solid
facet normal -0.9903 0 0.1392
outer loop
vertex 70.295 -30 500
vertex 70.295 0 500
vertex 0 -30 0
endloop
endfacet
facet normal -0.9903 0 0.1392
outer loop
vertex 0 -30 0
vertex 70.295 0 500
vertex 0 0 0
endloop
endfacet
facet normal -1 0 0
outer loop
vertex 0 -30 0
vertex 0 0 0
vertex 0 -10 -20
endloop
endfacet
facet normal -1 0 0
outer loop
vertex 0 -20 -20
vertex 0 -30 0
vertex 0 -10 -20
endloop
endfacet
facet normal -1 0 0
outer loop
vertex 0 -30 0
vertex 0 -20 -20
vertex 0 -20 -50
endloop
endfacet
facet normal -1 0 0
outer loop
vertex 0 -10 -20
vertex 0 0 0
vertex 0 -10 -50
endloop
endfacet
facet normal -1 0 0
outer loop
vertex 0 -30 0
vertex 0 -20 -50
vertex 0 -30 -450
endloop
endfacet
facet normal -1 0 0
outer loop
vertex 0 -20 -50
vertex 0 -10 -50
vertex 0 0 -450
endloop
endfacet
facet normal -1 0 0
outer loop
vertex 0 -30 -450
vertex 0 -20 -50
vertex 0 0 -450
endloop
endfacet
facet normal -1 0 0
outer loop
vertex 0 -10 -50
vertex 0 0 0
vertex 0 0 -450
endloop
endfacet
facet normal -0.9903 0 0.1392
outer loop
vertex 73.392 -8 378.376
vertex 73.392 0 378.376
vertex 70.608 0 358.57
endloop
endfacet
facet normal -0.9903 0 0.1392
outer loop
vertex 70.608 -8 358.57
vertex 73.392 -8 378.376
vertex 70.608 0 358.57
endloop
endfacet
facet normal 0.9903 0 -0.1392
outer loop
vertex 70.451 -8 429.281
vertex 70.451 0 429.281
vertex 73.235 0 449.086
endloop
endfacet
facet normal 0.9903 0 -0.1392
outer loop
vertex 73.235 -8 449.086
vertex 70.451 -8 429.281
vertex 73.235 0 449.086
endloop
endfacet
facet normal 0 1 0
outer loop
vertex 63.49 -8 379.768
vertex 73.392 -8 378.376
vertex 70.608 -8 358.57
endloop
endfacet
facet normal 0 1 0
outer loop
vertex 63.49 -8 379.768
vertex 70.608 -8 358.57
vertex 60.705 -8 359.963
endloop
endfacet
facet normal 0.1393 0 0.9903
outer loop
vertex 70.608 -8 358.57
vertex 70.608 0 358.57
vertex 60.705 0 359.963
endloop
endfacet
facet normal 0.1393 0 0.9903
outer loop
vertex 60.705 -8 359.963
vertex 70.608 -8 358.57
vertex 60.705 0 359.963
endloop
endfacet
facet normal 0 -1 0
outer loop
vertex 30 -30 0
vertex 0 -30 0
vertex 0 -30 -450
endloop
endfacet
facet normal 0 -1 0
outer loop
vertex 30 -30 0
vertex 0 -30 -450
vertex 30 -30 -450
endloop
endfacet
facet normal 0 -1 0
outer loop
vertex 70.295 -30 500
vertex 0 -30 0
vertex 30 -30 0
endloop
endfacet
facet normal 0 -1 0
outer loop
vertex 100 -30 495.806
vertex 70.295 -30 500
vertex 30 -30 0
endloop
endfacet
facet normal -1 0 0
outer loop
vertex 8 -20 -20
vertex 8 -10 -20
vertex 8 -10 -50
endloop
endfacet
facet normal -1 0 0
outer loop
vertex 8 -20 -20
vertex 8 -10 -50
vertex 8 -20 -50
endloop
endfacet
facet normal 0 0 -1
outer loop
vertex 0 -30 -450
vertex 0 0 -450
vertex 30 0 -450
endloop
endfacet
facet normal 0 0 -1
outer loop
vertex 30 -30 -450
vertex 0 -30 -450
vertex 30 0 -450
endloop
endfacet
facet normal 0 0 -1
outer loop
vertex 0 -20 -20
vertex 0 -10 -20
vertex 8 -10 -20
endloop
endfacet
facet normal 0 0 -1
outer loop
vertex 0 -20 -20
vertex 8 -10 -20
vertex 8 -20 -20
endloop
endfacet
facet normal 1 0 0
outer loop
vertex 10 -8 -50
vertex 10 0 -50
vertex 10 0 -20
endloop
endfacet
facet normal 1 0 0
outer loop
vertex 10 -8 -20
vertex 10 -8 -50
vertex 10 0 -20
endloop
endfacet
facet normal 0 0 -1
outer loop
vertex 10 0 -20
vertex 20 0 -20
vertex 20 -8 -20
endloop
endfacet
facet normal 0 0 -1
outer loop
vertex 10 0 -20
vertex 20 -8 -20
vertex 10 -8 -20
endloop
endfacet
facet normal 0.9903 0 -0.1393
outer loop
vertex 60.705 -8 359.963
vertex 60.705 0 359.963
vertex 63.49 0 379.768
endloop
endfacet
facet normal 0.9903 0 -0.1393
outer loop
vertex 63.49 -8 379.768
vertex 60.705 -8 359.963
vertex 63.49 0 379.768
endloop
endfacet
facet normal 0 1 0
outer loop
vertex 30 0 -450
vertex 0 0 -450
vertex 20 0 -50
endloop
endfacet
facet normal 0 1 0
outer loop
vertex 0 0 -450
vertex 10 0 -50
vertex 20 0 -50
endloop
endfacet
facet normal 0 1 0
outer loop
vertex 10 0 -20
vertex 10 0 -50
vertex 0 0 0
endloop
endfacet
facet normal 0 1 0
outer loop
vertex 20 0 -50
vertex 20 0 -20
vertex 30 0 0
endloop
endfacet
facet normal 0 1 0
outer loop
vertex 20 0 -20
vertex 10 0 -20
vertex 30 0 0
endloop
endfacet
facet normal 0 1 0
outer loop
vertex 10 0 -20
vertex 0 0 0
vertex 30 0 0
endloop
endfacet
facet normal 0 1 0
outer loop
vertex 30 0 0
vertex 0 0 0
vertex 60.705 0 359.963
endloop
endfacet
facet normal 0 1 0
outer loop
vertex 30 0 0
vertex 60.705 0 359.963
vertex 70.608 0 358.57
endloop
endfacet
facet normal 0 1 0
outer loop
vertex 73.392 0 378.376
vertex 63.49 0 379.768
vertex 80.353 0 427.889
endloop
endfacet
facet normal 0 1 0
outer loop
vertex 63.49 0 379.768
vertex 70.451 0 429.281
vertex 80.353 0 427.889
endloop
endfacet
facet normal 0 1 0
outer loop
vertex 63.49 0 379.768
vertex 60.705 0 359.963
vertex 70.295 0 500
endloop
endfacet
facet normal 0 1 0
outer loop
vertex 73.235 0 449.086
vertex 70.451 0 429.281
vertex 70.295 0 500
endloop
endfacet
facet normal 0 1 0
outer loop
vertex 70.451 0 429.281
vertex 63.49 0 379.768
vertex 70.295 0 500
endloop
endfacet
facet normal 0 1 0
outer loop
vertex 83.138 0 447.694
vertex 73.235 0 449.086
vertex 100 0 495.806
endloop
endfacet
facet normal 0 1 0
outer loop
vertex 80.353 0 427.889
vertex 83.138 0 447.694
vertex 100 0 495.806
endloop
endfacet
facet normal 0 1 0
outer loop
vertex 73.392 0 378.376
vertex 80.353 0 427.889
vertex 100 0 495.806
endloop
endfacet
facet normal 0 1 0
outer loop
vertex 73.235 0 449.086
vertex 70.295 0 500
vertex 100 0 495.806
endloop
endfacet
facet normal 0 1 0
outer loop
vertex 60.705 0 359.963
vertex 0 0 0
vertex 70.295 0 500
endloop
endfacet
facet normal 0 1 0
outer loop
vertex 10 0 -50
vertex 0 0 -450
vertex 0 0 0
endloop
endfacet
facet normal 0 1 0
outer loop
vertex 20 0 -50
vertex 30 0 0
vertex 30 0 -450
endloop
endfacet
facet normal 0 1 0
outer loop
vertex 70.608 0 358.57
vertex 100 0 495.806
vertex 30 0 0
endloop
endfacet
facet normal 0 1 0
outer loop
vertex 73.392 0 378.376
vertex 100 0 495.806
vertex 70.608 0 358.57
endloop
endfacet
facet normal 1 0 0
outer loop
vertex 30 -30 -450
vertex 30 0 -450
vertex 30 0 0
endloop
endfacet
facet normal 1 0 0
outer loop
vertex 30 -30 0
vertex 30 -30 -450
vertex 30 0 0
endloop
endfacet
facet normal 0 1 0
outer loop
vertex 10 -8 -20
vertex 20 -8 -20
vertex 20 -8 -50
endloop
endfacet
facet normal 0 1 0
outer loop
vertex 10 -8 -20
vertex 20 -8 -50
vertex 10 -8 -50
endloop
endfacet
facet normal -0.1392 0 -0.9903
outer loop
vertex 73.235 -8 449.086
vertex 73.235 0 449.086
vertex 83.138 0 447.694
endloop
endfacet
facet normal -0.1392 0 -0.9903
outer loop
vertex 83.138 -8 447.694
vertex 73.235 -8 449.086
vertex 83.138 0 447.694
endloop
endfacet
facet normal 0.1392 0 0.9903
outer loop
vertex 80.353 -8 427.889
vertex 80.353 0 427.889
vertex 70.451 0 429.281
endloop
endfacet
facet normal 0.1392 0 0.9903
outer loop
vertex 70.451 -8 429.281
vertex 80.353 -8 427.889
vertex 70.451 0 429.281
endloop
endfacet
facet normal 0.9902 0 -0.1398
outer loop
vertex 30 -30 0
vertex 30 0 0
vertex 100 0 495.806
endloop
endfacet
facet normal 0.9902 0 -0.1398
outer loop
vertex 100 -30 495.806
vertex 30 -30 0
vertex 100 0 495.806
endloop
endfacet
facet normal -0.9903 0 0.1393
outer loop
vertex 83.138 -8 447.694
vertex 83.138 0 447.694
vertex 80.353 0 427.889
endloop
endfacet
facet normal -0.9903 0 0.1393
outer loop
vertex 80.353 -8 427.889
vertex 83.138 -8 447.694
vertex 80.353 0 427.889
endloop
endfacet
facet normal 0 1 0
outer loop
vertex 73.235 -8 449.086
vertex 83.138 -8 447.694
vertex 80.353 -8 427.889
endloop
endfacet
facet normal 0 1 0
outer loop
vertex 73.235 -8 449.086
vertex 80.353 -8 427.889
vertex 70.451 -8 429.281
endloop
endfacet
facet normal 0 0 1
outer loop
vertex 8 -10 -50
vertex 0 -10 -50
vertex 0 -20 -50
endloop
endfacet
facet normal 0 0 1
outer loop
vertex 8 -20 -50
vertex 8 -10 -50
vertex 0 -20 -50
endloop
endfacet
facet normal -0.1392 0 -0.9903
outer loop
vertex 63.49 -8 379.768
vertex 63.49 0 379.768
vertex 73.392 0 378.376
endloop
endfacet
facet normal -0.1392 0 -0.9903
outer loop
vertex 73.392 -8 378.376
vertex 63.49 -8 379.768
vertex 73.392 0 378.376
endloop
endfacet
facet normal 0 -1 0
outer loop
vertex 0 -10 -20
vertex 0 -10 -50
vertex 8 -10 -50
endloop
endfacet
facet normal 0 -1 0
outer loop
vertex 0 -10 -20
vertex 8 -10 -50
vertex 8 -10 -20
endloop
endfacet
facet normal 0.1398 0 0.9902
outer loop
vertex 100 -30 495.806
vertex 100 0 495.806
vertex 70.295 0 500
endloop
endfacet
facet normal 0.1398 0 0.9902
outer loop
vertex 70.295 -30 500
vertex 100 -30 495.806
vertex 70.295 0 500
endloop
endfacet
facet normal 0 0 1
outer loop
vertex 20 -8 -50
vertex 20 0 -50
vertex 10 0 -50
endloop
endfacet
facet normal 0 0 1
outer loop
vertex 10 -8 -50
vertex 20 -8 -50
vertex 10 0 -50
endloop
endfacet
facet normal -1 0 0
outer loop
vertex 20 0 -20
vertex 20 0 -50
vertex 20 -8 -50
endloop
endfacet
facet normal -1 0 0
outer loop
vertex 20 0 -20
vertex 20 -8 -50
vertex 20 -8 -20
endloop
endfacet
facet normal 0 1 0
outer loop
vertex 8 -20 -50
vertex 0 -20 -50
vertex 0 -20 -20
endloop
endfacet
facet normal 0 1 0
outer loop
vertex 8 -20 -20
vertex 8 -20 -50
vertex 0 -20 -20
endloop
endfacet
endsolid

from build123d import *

# Parameters (mm, degrees)
F1_DEPTH = 30
F3_DEPTH = 8
F4_W     = 10
F4_H     = 30
F5_DEPTH = 8
F6_W     = 10
F6_H     = 30
F7_DEPTH = 8


with BuildPart() as f1:
    # F0 (on Front) → F1 (new body)
    with BuildSketch(Plane.XZ):
        Polygon((70.294598, 500), (0, 0), (0, -450), (30, -450), (30, 0), (100, 495.806066), align=None)
    extrude(amount=F1_DEPTH)

    # F2 (on face) → F3 (cut)
    with BuildSketch(Plane(origin=(0, 0, 0), x_dir=(-1, 0, 0), z_dir=(0, 1, 0))):
        Polygon((-73.234991, 449.086059), (-83.137606, 447.693859), (-80.353204, 427.888629), (-70.45059, 429.28083), align=None)
        Polygon((-63.489587, 379.767757), (-73.392201, 378.375556), (-70.6078, 358.570327), (-60.705185, 359.962527), align=None)
    extrude(amount=-F3_DEPTH, mode=Mode.SUBTRACT)

    # F4 (on face) → F5 (cut)
    with BuildSketch(Plane(origin=(0, 0, 0), x_dir=(-1, 0, 0), z_dir=(0, 1, 0))):
        with Locations((-15, -35)):
            Rectangle(F4_W, F4_H)
    extrude(amount=-F5_DEPTH, mode=Mode.SUBTRACT)

    # F6 (on face) → F7 (cut)
    with BuildSketch(Plane(origin=(0, 0, 0), x_dir=(0, -1, 0), z_dir=(-1, 0, 0))):
        with Locations((15, -35)):
            Rectangle(F6_W, F6_H)
    extrude(amount=-F7_DEPTH, mode=Mode.SUBTRACT)


solid = f1.part
